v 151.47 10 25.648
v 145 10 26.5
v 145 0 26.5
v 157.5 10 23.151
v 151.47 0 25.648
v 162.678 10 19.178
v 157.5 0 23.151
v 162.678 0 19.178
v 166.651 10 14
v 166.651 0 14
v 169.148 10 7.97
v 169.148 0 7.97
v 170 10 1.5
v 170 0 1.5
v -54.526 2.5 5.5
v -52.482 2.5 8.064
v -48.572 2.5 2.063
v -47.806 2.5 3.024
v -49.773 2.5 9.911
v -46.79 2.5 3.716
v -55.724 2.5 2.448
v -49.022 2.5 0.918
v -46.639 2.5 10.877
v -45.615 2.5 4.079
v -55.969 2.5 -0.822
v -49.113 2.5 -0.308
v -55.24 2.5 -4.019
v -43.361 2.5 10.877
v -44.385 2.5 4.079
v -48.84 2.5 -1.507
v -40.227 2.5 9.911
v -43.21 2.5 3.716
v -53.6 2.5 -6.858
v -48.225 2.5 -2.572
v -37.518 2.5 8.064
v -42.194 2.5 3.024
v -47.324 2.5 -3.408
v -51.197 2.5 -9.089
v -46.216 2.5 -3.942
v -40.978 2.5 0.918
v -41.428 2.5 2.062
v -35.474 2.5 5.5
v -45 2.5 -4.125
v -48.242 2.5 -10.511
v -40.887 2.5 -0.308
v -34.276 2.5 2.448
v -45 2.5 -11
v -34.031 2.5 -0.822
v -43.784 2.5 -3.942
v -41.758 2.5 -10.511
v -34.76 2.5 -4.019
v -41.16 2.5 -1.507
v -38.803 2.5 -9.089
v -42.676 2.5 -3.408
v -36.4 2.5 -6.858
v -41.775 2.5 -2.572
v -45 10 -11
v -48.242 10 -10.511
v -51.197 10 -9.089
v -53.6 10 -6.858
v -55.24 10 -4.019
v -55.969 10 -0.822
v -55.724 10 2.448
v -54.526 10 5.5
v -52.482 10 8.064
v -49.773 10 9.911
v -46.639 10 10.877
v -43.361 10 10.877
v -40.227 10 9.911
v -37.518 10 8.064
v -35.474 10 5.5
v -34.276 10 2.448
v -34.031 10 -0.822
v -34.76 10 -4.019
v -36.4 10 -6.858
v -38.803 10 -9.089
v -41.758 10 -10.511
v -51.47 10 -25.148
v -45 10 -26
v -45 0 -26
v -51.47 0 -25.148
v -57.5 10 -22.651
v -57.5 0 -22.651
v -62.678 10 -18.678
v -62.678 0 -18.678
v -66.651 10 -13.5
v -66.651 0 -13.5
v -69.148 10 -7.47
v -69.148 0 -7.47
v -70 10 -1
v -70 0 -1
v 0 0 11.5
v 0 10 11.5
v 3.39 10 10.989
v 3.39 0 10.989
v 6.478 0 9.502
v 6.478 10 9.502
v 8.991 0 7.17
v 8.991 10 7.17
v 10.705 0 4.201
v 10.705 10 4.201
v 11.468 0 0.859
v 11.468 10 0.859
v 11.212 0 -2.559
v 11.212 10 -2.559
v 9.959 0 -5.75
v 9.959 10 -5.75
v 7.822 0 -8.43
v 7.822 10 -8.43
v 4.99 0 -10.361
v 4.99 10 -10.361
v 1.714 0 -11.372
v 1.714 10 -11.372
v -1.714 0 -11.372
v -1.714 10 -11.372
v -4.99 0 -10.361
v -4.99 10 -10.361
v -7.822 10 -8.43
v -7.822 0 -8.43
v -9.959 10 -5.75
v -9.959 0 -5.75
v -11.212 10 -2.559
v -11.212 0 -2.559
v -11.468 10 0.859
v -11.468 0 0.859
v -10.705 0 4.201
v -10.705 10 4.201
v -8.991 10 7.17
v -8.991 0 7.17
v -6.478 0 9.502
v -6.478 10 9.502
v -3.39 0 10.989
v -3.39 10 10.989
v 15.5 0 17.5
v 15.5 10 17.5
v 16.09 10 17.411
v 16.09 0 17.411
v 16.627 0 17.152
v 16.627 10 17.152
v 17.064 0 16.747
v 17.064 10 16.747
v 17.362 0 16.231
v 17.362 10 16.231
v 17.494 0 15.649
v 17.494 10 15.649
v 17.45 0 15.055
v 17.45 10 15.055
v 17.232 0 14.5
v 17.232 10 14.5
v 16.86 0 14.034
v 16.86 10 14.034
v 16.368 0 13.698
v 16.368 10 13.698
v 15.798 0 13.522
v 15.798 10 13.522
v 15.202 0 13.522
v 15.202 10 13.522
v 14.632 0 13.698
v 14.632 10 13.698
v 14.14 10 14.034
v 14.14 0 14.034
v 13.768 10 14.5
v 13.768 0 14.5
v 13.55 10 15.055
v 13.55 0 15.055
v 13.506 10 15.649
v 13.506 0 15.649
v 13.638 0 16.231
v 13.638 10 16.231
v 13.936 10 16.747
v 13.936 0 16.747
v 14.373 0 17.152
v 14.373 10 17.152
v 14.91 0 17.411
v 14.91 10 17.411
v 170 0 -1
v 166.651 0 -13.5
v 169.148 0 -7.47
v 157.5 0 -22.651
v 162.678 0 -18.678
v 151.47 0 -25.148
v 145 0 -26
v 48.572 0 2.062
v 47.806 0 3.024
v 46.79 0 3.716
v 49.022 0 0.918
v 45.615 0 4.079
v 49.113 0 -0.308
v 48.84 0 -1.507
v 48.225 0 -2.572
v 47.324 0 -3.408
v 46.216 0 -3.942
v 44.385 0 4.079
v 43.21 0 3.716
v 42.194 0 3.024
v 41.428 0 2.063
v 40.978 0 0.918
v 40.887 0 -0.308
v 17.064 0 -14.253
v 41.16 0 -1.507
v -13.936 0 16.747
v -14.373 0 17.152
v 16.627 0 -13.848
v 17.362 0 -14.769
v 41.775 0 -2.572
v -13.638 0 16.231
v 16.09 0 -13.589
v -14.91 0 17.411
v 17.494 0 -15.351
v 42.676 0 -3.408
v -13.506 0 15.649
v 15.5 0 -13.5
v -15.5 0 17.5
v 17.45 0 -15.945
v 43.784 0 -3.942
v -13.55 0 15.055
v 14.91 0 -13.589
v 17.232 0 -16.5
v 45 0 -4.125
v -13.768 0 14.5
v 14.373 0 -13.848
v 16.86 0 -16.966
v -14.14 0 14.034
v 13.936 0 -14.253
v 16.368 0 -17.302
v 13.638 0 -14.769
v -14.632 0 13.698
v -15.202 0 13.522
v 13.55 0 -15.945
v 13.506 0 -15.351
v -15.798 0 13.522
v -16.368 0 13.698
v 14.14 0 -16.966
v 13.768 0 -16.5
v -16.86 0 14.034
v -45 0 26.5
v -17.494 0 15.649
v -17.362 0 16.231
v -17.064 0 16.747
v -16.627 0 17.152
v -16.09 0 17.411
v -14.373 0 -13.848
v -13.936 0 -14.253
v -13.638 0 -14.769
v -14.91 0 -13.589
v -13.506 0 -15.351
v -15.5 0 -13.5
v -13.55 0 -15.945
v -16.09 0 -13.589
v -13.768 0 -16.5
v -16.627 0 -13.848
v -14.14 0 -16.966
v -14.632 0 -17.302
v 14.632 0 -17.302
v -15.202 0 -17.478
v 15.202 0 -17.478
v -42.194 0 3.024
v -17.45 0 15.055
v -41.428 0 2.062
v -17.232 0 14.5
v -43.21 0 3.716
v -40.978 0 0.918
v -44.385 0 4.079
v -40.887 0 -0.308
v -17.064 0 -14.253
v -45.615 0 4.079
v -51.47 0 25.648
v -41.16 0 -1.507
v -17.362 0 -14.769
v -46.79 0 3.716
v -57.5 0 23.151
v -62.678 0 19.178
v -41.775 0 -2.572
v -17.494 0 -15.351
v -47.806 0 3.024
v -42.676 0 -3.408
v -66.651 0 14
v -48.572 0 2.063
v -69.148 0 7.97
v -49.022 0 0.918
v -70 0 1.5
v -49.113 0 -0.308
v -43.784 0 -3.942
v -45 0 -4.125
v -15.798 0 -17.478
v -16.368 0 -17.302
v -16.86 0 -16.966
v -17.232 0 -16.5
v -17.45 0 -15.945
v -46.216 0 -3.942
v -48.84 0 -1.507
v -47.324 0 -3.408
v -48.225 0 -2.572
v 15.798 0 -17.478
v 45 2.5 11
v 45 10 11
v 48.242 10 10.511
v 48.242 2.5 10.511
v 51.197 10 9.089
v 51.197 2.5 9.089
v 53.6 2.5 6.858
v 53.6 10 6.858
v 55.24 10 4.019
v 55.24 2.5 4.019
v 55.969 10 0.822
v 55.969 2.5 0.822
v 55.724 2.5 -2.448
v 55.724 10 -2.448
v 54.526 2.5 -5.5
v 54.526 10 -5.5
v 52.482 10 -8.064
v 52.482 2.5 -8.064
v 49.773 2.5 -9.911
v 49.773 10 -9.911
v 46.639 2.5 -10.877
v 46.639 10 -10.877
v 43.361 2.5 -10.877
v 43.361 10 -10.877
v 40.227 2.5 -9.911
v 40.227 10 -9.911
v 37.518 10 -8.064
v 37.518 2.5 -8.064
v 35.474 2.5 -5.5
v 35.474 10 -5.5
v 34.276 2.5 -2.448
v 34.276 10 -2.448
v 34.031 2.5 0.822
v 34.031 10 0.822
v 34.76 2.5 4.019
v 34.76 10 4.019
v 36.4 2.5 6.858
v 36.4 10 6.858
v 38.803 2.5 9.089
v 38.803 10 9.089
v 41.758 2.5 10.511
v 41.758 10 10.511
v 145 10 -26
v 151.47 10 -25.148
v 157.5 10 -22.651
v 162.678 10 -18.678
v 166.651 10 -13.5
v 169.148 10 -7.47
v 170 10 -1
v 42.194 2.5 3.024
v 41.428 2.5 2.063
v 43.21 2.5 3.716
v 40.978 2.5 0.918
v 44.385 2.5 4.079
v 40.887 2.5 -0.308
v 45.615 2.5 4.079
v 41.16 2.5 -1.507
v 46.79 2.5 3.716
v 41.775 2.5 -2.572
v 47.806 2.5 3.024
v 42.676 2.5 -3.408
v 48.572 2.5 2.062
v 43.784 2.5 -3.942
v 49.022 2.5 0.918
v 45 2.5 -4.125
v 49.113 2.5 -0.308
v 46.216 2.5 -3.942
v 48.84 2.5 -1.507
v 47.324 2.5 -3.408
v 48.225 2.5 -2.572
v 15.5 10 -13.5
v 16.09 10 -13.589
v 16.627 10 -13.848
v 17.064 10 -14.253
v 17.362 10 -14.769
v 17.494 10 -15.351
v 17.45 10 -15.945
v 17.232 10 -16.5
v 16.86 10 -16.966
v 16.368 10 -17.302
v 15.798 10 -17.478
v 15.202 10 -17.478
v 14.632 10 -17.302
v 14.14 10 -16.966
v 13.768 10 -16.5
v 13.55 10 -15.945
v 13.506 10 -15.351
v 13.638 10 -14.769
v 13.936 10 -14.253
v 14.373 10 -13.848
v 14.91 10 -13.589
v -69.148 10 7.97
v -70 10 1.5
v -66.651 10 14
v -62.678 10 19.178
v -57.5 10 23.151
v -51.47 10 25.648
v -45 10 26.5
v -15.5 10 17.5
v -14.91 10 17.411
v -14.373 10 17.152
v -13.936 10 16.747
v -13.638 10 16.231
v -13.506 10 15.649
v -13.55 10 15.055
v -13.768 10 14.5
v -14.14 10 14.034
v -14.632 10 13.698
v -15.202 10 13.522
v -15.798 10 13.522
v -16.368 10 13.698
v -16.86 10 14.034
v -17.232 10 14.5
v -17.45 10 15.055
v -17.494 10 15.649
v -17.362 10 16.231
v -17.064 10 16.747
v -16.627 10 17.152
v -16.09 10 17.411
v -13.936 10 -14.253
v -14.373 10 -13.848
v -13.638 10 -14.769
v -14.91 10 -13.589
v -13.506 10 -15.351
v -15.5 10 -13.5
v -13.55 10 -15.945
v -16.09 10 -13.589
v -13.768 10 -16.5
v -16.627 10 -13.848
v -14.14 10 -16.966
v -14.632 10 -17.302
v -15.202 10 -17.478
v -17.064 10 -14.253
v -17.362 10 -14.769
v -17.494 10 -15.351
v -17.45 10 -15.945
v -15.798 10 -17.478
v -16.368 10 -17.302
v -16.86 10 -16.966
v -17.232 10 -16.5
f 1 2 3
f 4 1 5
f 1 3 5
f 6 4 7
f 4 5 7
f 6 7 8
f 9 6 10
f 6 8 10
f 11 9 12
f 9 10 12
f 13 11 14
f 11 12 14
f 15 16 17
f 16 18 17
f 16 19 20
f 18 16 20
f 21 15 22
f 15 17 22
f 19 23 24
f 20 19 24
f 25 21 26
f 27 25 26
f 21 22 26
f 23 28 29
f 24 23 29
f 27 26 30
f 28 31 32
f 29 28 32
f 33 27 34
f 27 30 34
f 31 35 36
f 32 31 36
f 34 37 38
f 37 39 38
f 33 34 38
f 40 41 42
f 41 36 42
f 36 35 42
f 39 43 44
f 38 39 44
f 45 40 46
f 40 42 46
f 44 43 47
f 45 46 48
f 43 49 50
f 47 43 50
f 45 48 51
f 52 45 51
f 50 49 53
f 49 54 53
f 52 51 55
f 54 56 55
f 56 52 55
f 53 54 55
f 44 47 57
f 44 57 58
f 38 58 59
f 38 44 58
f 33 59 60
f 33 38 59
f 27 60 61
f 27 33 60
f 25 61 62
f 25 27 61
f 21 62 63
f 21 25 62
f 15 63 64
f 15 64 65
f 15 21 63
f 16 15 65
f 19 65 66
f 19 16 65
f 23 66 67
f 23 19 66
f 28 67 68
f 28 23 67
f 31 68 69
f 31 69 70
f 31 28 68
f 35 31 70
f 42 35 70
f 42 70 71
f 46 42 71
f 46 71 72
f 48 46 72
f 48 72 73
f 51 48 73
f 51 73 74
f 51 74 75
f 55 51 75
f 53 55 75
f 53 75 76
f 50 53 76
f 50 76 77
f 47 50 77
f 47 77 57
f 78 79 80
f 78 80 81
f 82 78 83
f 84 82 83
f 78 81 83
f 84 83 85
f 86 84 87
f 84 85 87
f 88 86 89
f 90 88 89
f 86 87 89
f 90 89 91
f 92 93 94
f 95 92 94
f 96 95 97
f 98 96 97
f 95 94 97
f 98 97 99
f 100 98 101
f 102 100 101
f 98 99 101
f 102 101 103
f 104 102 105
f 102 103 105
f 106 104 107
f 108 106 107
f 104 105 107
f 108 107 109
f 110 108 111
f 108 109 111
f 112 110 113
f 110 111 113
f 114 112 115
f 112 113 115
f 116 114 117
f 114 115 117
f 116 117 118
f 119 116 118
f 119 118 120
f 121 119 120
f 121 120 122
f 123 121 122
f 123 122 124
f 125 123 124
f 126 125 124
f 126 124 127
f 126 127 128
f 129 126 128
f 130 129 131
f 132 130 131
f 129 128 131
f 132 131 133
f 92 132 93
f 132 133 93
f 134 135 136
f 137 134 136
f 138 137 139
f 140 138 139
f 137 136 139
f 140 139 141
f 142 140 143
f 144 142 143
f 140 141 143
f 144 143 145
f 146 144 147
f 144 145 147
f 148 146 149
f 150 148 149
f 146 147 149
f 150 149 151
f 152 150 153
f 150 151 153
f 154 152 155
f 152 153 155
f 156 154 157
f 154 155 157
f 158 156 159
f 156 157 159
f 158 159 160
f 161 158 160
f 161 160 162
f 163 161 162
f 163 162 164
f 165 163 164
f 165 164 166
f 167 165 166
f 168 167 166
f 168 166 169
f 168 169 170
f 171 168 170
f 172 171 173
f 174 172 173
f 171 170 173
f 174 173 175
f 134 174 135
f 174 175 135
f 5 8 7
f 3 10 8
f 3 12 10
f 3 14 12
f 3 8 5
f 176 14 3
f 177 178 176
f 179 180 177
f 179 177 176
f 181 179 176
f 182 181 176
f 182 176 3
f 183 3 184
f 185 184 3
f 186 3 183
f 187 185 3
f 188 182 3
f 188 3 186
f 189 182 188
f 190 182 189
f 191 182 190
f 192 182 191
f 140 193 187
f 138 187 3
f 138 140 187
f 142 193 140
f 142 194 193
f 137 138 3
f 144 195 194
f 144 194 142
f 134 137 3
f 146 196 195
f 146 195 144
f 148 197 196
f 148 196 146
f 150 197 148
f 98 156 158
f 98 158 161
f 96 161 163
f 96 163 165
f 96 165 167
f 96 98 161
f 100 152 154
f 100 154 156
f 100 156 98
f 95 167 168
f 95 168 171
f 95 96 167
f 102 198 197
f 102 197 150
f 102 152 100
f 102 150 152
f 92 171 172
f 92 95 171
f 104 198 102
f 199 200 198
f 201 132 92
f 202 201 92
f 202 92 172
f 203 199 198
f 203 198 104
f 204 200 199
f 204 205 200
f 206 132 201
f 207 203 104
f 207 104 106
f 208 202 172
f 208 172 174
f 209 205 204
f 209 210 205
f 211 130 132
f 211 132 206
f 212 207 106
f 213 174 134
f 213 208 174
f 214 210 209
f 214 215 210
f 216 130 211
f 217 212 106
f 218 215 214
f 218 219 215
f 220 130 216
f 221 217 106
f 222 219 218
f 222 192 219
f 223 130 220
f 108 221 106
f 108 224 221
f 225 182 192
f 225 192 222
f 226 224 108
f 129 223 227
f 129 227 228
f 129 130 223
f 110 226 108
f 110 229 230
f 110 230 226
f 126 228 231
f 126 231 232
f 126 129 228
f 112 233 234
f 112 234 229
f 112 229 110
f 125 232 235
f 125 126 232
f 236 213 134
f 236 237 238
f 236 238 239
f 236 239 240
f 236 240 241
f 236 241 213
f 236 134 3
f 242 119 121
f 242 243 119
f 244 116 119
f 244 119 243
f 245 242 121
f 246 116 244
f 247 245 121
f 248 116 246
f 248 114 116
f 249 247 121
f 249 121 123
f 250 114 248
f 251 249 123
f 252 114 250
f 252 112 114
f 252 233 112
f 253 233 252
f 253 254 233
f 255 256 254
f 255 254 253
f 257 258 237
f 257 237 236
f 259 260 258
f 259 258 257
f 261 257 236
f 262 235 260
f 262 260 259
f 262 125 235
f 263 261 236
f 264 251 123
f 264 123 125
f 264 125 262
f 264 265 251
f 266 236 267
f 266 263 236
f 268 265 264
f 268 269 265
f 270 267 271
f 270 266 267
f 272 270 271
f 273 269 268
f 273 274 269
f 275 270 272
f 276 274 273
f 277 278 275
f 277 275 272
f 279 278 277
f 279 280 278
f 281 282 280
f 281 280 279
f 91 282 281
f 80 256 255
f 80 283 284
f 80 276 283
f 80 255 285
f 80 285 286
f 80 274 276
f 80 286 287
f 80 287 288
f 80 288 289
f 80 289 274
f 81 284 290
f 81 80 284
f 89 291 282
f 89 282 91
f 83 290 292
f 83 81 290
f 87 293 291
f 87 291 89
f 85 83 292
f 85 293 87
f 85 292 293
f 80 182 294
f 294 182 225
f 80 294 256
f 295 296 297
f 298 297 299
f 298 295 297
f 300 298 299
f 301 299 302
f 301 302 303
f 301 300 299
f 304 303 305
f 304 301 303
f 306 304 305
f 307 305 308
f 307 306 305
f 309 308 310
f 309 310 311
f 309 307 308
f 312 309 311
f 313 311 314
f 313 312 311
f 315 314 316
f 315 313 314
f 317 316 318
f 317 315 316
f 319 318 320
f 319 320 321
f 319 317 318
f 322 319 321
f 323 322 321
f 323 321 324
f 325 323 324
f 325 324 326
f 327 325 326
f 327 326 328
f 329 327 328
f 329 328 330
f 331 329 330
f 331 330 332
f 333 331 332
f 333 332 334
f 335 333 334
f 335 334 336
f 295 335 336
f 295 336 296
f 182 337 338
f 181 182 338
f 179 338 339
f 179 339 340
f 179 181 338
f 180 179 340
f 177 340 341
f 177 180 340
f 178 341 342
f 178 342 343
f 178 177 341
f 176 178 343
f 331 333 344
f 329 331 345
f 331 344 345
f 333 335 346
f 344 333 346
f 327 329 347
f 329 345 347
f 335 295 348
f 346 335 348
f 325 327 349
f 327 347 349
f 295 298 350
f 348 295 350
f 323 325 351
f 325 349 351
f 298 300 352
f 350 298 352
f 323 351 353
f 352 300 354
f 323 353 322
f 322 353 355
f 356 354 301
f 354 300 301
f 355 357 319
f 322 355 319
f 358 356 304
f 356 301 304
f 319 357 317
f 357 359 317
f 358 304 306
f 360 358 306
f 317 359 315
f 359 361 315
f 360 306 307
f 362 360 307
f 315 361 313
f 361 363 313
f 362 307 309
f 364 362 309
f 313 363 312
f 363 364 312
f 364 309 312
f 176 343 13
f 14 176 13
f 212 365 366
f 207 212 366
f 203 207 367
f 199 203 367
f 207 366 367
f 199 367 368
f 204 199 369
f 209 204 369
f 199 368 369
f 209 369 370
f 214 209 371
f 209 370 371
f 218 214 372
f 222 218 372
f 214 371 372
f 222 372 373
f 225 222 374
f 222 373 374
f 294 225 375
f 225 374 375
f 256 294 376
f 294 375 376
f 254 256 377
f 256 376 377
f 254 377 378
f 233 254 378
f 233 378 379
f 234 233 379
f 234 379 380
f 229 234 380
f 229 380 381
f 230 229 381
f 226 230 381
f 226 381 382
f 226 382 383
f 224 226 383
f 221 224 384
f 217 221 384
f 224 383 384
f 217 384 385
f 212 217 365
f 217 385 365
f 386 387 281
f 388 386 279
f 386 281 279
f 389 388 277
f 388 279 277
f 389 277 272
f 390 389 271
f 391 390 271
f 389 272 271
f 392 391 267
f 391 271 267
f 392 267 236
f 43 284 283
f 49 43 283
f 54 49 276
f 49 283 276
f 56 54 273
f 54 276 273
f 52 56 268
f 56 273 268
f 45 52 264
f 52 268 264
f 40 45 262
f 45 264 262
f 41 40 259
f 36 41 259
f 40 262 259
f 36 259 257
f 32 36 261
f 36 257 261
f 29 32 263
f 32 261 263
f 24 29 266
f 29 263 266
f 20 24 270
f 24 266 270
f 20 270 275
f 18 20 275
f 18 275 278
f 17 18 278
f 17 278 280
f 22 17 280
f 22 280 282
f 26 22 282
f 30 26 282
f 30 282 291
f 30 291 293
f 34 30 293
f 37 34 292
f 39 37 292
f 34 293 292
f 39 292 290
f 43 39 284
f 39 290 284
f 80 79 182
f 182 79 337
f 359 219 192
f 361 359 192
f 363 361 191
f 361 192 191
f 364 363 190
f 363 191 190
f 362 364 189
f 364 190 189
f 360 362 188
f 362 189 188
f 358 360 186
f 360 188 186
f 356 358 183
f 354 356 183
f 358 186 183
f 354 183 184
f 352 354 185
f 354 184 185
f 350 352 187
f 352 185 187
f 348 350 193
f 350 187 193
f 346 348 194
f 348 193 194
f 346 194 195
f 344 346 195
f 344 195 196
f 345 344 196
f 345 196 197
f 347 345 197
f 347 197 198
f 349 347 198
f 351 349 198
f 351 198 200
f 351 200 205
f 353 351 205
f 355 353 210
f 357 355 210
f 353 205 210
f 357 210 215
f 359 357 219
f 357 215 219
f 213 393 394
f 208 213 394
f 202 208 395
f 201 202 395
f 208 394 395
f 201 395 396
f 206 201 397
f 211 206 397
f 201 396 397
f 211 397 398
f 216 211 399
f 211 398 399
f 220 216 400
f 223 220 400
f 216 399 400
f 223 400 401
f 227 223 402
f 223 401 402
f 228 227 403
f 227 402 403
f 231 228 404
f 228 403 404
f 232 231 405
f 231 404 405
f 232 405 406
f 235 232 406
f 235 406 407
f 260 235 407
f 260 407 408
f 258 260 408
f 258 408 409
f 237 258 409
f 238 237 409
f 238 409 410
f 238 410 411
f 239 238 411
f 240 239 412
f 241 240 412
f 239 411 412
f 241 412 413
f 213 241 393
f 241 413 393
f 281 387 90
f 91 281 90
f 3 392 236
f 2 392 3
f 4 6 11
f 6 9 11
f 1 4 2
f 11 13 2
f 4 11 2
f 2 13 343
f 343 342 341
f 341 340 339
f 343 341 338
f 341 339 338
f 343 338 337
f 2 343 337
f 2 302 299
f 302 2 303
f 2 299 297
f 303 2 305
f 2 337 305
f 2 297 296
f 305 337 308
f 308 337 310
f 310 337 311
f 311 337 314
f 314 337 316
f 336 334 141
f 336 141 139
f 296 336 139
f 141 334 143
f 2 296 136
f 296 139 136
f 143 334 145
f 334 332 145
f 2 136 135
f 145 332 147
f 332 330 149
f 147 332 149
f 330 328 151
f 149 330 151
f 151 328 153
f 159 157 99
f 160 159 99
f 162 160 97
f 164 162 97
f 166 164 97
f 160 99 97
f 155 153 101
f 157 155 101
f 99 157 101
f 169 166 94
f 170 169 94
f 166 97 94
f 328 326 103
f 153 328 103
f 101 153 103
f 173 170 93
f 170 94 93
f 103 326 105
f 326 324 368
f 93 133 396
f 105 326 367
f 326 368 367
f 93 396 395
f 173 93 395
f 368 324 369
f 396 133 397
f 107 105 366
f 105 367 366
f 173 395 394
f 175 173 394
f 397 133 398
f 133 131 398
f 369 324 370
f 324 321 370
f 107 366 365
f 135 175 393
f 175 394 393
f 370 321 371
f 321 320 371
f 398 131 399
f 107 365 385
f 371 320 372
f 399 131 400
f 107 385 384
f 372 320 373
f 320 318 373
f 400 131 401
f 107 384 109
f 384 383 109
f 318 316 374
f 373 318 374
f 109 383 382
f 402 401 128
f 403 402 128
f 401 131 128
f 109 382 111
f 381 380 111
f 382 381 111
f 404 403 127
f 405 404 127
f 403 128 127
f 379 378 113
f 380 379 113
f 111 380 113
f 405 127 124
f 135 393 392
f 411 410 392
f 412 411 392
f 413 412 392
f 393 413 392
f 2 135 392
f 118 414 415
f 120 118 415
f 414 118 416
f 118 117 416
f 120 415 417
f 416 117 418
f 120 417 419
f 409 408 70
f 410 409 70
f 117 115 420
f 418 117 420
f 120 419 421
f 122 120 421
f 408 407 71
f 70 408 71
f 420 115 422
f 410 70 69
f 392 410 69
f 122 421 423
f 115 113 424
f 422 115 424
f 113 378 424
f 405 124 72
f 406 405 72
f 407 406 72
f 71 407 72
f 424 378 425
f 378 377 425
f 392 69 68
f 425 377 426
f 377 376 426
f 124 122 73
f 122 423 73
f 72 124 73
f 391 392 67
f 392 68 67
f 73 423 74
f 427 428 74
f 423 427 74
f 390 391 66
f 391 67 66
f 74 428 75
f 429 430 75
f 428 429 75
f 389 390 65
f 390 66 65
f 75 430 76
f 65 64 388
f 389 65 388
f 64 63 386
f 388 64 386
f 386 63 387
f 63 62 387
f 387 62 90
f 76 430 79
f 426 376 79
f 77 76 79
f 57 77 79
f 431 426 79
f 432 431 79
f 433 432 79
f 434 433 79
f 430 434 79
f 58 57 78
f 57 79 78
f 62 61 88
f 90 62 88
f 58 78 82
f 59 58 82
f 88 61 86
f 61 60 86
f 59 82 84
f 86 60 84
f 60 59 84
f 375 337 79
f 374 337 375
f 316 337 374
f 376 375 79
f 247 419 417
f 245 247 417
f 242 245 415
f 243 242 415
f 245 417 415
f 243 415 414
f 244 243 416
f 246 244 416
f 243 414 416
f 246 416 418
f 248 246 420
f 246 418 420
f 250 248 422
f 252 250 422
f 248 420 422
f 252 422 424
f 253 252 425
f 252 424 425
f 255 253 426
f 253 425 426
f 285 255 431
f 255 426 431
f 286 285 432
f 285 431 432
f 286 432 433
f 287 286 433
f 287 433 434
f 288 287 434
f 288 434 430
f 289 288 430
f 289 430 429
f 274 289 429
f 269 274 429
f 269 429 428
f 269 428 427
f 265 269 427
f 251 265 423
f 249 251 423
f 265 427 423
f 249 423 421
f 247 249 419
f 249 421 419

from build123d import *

# Parameters (mm, degrees)
SKETCH1_R           = 11
BOSS_EXTRUDE1_DEPTH = 10
SKETCH2_R           = 11
SKETCH2_R_2         = 4.125
BOSS_EXTRUDE2_DEPTH = 2.5
SKETCH4_R           = 2
SKETCH4_R_2         = 11.5
CUT_EXTRUDE1_DEPTH  = 10
BOSS_EXTRUDE3_DEPTH = 10
BOSS_EXTRUDE4_DEPTH = 10
FILLET1_R           = 25
CUT_EXTRUDE5_DEPTH  = 10
BOSS_EXTRUDE6_DEPTH = 10
FILLET3_R           = 25
BOSS_EXTRUDE7_DEPTH = 10
FILLET4_R           = 25


with BuildPart() as part:
    # Sketch1 → Boss-Extrude1 (new body)
    with BuildSketch(Plane(origin=(0, 0, 0), x_dir=(1, 0, 0), z_dir=(0, 1, 0))):
        with BuildLine():
            Line((-45, -27), (-25, -27))
            Line((-25, -27), (25, -27))
            Line((25, -27), (45, -27))
            Line((45, -27), (70, -27))
            Line((70, -27), (70, -2))
            Line((70, -2), (70, 0))
            ThreePointArc((70, 0), (62.67766953, 17.67766953), (45, 25))
            Line((45, 25), (-45, 25))
            ThreePointArc((-45, 25), (-62.67766953, 17.67766953), (-70, 0))
            Line((-70, 0), (-70, -2))
            Line((-70, -2), (-70, -27))
            Line((-70, -27), (-45, -27))
        make_face()
        with Locations(Location((-45, 0, 0), (0, 0, 90))):  # turned: the seam where the file's is
            Circle(SKETCH1_R, mode=Mode.SUBTRACT)
        with Locations(Location((45, 0, 0), (0, 0, 270))):  # turned: the seam where the file's is
            Circle(SKETCH1_R, mode=Mode.SUBTRACT)
    extrude(amount=BOSS_EXTRUDE1_DEPTH)

    # Sketch2 → Boss-Extrude2 (add)
    with BuildSketch(Plane.XZ):
        with Locations(Location((45, 0, 0), (0, 0, 270))):  # turned: the seam where the file's is
            Circle(SKETCH2_R)
        with Locations(Location((45, 0, 0), (0, 0, 270))):  # turned: the seam where the file's is
            Circle(SKETCH2_R_2, mode=Mode.SUBTRACT)
        with Locations(Location((-45, 0, 0), (0, 0, 270))):  # turned: the seam where the file's is
            Circle(SKETCH2_R)
        with Locations(Location((-45, 0, 0), (0, 0, 270))):  # turned: the seam where the file's is
            Circle(SKETCH2_R_2, mode=Mode.SUBTRACT)
    extrude(amount=-BOSS_EXTRUDE2_DEPTH)

    # Sketch4 → Cut-Extrude1 (cut)
    with BuildSketch(Plane(origin=(0, 10, 0), x_dir=(1, 0, 0), z_dir=(0, 1, 0))):
        with Locations(Location((15.5, 15.5, 0), (0, 0, 270))):  # turned: the seam where the file's is
            Circle(SKETCH4_R)
        with Locations(Location((-15.5, 15.5, 0), (0, 0, 270))):  # turned: the seam where the file's is
            Circle(SKETCH4_R)
        with Locations(Location((-15.5, -15.5, 0), (0, 0, 270))):  # turned: the seam where the file's is
            Circle(SKETCH4_R)
        with Locations(Location((15.5, -15.5, 0), (0, 0, 270))):  # turned: the seam where the file's is
            Circle(SKETCH4_R)
        with Locations(Location((0, 0, 0), (0, 0, 270))):  # turned: the seam where the file's is
            Circle(SKETCH4_R_2)
    extrude(amount=-CUT_EXTRUDE1_DEPTH, mode=Mode.SUBTRACT)

    # Sketch5 → Boss-Extrude3 (add)
    with BuildSketch(Plane(origin=(0, 0, 0), x_dir=(-1, 0, 0), z_dir=(0, -1, 0))):
        Polygon((-70, -27), (-151.373495533, -27), (-151.373495533, 25), (-45, 25), (-50.986838326, 16.31487445), (-65.445821875, 2.682118533), (-66.139224666, -20.893576385), align=None)
    extrude(amount=-BOSS_EXTRUDE3_DEPTH)

    # Sketch6 → Boss-Extrude4 (add)
    with BuildSketch(Plane(origin=(0, 0, 0), x_dir=(-1, 0, 0), z_dir=(0, -1, 0))):
        Polygon((-151.373495533, 25), (-170, 25), (-170, -27), (-151.373495533, -27), (-141.038307318, -1), align=None)
    extrude(amount=-BOSS_EXTRUDE4_DEPTH)

    # Fillet1
    fillet1_edges = [part.edges().sort_by_distance(p)[0] for p in [
        (170, 5, 27),
        (170, 5, -25),
        (-70, 5, 27),
    ]]
    fillet(fillet1_edges, radius=FILLET1_R)

    # Sketch7 → Cut-Extrude5 (cut)
    with BuildSketch(Plane(origin=(0, 10, 0), x_dir=(1, 0, 0), z_dir=(0, 1, 0))):
        with BuildLine():
            Line((133.980635502, -69.297657421), (165.367779164, -26))
            Line((165.367779164, -26), (152, -26))
            ThreePointArc((152, -26), (148.535533906, -26.748737342), (145, -27))
            Line((145, -27), (-45, -27))
            ThreePointArc((-45, -27), (-48.535533906, -26.748737342), (-52, -26))
            Line((-52, -26), (-59.265699986, -26))
            Line((-59.265699986, -26), (-45.110713629, -66.528203569))
            Line((-45.110713629, -66.528203569), (133.980635502, -69.297657421))
        make_face()
        with BuildLine():
            ThreePointArc((145, -27), (148.535533906, -26.748737342), (152, -26))
            Line((152, -26), (-52, -26))
            ThreePointArc((-52, -26), (-48.535533906, -26.748737342), (-45, -27))
            Line((-45, -27), (145, -27))
        make_face()
    extrude(amount=-CUT_EXTRUDE5_DEPTH, mode=Mode.SUBTRACT)

    # Sketch10 → Boss-Extrude6 (add)
    with BuildSketch(Plane(origin=(0, 10, 0), x_dir=(1, 0, 0), z_dir=(0, 1, 0))):
        with BuildLine():
            Line((-63.907316272, 7.976406282), (-70, 0))
            ThreePointArc((-70, 0), (-62.67766953, 17.67766953), (-45, 25))
            Line((-45, 25), (145, 25))
            ThreePointArc((145, 25), (162.67766953, 17.67766953), (170, 0))
            Line((170, 0), (55.598298081, 15.952812565))
            Line((55.598298081, 15.952812565), (0, 23.705749919))
            Line((0, 23.705749919), (-30.230523, 19.829281242))
            Line((-30.230523, 19.829281242), (-63.907316272, 7.976406282))
        make_face()
        with BuildLine():
            Line((-70, 0), (-70, 26))
            Line((-70, 26), (170, 26))
            Line((170, 26), (170, 0))
            ThreePointArc((170, 0), (162.67766953, 17.67766953), (145, 25))
            Line((145, 25), (-45, 25))
            ThreePointArc((-45, 25), (-62.67766953, 17.67766953), (-70, 0))
        make_face()
    extrude(amount=-BOSS_EXTRUDE6_DEPTH)

    # Fillet3
    fillet3_edges = [part.edges().sort_by_distance(p)[0] for p in [
        (-70, 5, -26),
        (170, 5, -26),
    ]]
    fillet(fillet3_edges, radius=FILLET3_R)

    # Sketch11 → Boss-Extrude7 (add)
    with BuildSketch(Plane(origin=(0, 10, 0), x_dir=(1, 0, 0), z_dir=(0, 1, 0))):
        with BuildLine():
            Line((170, -2), (170, -0.5))
            Line((170, -0.5), (142.437846572, -19.831941741))
            Line((142.437846572, -19.831941741), (-54.330276999, -19.831941741))
            Line((-54.330276999, -19.831941741), (-70, -0.5))
            Line((-70, -0.5), (-70, -2))
            ThreePointArc((-70, -2), (-65, -17), (-52, -26))
            Line((-52, -26), (152, -26))
            ThreePointArc((152, -26), (165, -17), (170, -2))
        make_face()
        with BuildLine():
            Line((170, -26.5), (170, -2))
            ThreePointArc((170, -2), (165, -17), (152, -26))
            Line((152, -26), (-52, -26))
            ThreePointArc((-52, -26), (-65, -17), (-70, -2))
            Line((-70, -2), (-70, -26.5))
            Line((-70, -26.5), (170, -26.5))
        make_face()
    extrude(amount=-BOSS_EXTRUDE7_DEPTH)

    # Fillet4
    fillet4_edges = [part.edges().sort_by_distance(p)[0] for p in [
        (-70, 5, 26.5),
        (170, 5, 26.5),
    ]]
    fillet(fillet4_edges, radius=FILLET4_R)


solid = part.part
